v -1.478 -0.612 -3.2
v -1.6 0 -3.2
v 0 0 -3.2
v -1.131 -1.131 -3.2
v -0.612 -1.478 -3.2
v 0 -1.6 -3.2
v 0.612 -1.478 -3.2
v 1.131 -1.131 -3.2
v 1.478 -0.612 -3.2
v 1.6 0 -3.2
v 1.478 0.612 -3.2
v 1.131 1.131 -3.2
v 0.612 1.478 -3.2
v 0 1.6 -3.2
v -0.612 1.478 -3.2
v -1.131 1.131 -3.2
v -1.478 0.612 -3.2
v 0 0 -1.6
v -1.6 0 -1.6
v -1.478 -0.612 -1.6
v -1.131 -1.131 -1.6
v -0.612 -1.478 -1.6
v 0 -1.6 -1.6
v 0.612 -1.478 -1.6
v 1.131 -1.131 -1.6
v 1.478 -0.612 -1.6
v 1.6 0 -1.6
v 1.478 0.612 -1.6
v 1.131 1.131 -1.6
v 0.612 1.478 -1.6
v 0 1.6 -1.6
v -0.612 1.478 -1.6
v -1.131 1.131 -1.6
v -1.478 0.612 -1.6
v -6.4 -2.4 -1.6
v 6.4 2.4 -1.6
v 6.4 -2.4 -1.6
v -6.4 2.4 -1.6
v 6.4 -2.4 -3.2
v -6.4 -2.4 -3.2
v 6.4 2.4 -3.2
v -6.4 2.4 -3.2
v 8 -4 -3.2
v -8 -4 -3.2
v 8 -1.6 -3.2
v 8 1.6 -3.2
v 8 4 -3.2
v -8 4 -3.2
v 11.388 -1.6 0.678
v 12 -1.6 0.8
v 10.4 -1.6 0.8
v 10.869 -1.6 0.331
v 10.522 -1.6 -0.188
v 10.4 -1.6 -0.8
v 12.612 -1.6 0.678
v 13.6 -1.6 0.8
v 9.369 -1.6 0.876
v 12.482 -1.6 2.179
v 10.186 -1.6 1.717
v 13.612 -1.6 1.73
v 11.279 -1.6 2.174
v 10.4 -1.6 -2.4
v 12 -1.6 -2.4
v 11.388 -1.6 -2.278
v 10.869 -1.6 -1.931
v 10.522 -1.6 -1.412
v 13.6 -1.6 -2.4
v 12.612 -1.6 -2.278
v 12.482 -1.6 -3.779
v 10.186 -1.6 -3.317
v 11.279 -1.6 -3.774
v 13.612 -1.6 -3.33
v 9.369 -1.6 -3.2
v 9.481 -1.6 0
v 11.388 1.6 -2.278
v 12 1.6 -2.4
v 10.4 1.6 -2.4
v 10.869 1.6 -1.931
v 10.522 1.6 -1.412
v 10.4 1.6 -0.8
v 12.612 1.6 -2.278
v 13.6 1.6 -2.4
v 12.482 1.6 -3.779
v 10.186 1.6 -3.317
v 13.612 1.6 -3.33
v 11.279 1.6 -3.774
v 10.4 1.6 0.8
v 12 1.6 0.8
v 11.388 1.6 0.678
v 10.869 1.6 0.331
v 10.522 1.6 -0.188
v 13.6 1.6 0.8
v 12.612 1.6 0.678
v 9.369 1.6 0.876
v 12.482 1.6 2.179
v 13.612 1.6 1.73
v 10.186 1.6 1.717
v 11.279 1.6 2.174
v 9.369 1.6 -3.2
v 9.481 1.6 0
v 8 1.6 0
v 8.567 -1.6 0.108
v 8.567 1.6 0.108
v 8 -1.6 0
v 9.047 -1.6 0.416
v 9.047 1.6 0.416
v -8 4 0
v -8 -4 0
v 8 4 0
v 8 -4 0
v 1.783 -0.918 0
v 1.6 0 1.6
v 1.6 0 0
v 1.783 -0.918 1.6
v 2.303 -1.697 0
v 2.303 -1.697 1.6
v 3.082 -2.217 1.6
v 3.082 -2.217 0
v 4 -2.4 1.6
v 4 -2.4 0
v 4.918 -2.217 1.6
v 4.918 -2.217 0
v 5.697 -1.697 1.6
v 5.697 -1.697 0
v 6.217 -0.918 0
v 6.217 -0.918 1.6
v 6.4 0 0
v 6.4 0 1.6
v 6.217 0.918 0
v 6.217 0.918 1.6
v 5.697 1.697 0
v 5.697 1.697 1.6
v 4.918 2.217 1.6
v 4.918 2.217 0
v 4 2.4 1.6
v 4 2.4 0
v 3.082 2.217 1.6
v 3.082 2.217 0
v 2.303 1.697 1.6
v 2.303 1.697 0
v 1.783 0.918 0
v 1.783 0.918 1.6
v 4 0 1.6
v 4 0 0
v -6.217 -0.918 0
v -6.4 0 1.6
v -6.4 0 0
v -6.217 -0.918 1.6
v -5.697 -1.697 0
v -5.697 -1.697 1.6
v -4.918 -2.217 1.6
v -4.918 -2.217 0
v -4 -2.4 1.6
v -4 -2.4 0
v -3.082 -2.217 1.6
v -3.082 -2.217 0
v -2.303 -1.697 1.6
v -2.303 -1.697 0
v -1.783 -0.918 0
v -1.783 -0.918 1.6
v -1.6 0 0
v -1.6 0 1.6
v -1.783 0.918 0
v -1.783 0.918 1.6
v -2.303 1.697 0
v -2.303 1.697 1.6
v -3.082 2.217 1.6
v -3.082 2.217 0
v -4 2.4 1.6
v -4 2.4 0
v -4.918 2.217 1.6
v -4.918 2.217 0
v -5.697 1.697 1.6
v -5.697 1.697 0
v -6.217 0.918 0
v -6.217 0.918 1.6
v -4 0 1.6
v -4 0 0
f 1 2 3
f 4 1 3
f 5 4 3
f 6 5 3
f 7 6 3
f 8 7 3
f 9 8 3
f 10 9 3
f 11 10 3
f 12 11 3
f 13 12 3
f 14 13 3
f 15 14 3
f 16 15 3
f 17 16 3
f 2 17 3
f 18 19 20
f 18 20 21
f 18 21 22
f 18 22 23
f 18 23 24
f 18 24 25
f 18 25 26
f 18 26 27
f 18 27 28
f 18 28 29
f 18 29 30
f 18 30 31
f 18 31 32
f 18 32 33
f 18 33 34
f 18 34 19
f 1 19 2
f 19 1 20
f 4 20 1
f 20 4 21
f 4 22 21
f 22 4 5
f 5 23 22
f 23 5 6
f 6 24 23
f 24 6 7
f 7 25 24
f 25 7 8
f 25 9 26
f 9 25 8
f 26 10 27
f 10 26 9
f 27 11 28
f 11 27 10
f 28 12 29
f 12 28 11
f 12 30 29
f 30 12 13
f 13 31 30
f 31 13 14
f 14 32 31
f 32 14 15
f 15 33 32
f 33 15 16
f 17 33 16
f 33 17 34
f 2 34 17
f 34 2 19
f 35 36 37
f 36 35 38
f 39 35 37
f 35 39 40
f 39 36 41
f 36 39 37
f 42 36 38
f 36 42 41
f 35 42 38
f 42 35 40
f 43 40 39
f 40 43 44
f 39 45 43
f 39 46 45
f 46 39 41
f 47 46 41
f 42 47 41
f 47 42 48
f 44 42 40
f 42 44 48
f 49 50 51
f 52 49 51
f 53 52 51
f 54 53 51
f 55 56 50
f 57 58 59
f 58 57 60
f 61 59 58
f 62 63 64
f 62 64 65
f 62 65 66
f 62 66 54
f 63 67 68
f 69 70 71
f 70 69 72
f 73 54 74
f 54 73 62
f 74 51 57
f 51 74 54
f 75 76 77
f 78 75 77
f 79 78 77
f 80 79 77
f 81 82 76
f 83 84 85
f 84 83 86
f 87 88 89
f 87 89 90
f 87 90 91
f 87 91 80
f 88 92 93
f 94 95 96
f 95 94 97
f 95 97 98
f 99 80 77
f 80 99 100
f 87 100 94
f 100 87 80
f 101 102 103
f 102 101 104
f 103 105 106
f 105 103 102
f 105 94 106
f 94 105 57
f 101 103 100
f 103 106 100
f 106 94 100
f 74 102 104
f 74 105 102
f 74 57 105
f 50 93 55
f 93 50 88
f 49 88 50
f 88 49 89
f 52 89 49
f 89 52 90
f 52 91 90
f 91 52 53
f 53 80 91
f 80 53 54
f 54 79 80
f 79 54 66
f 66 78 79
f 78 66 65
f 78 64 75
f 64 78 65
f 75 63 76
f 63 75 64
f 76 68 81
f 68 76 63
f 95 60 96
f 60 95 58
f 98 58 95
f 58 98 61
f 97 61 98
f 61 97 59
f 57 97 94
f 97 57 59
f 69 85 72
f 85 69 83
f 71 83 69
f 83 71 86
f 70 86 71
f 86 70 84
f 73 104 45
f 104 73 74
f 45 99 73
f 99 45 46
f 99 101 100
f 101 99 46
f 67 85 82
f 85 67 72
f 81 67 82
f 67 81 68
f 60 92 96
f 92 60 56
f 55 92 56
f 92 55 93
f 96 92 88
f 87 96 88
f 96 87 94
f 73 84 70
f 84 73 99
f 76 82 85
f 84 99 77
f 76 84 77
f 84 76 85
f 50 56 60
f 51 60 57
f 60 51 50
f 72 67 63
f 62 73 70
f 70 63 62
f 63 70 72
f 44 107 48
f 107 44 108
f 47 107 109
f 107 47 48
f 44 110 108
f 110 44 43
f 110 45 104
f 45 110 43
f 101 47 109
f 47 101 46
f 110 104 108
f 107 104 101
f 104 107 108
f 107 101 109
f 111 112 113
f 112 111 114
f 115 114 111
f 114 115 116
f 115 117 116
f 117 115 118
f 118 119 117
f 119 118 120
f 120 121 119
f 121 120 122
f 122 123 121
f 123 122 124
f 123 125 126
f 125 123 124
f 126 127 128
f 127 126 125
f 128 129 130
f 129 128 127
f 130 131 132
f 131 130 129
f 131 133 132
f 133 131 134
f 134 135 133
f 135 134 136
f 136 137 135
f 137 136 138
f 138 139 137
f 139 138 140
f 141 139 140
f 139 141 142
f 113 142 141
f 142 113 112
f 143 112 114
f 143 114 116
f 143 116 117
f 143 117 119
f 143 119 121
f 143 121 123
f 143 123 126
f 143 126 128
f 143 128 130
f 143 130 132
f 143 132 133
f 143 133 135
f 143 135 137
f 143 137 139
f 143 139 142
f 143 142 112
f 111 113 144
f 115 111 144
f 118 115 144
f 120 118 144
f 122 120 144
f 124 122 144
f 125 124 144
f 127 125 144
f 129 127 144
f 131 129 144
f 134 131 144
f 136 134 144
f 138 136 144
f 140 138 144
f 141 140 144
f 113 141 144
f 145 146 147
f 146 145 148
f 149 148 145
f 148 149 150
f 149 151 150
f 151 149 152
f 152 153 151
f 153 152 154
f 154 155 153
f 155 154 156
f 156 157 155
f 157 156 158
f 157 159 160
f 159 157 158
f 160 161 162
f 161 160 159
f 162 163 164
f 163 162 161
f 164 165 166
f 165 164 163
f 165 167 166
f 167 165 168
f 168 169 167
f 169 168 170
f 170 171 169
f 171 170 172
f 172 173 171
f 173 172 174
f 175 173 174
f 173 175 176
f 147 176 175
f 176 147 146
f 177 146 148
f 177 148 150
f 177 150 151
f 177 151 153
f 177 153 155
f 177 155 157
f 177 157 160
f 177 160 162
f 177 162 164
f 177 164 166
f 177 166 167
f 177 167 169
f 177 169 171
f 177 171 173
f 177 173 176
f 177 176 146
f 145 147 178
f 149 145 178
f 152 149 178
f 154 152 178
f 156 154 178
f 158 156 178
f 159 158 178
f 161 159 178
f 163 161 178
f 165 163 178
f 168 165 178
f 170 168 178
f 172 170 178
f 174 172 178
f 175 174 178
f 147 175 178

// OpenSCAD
use <../lib.scad>
use <../p/box3u2p.scad>
use <../p/box5.scad>
use <../p/clip6.scad>
use <../p/rect3.scad>
use <../p/stud3.scad>
use <../p/stug-1x2.scad>
function ldraw_lib__63868() = [
// 0 Plate  1 x  2 with Clip Horizontal on End (Thick C-Clip)
// 0 Name: 63868.dat
// 0 Author: Alex Taylor [anathema]
// 0 !LDRAW_ORG Part UPDATE 2013-02
// 0 !LICENSE Licensed under CC BY 4.0 : see CAreadme.txt
// 
// 0 BFC CERTIFY CCW
  [0,"BFC","CERTIFY"],
  [0,"BFC","CCW"],
// 
// 0 !HISTORY 2009-09-03 [PTadmin] Official Update 2009-02
// 0 !HISTORY 2013-02-09 [MagFors] Changed clip primitive
// 0 !HISTORY 2013-09-01 [MagFors] Changed description
// 0 !HISTORY 2013-12-23 [PTadmin] Official Update 2013-02
// 
// 
// 1 16 0 4 0 -1 0 0 0 -1 0 0 0 -1 stud3.dat
  [1,16,0,4,0,-1,0,0,0,-1,0,0,0,-1, ldraw_lib__stud3()],
// 0 BFC INVERTNEXT
  [0,"BFC","INVERTNEXT"],
// 1 16 0 8 0 -16 0 0 0 -4 0 0 0 -6 box5.dat
  [1,16,0,8,0,-16,0,0,0,-4,0,0,0,-6, ldraw_lib__box5()],
// 4 16 -20 8 -10 -16 8 -6 16 8 -6 20 8 -10
  [4,16,-20,8,-10,-16,8,-6,16,8,-6,20,8,-10],
// 3 16 16 8 -6 20 8 -4 20 8 -10
  [3,16,16,8,-6,20,8,-4,20,8,-10],
// 4 16 20 8 -4 16 8 -6 16 8 6 20 8 4
  [4,16,20,8,-4,16,8,-6,16,8,6,20,8,4],
// 3 16 20 8 10 20 8 4 16 8 6
  [3,16,20,8,10,20,8,4,16,8,6],
// 4 16 20 8 10 16 8 6 -16 8 6 -20 8 10
  [4,16,20,8,10,16,8,6,-16,8,6,-20,8,10],
// 4 16 -20 8 10 -16 8 6 -16 8 -6 -20 8 -10
  [4,16,-20,8,10,-16,8,6,-16,8,-6,-20,8,-10],
// 1 16 30 0 0 0 0 -1 0 1 0 1 0 0 clip6.dat
  [1,16,30,0,0,0,0,-1,0,1,0,1,0,0, ldraw_lib__clip6()],
// 1 16 20 4 0 0 -40 0 4 0 0 0 0 10 box3u2p.dat
  [1,16,20,4,0,0,-40,0,4,0,0,0,0,10, ldraw_lib__box3u2p()],
// 1 16 20 4 -7 0 -1 0 -4 0 0 0 0 3 rect3.dat
  [1,16,20,4,-7,0,-1,0,-4,0,0,0,0,3, ldraw_lib__rect3()],
// 1 16 20 4 7 0 -1 0 -4 0 0 0 0 -3 rect3.dat
  [1,16,20,4,7,0,-1,0,-4,0,0,0,0,-3, ldraw_lib__rect3()],
// 3 16 20 0 -10 20 0 -4 -20 0 -10
  [3,16,20,0,-10,20,0,-4,-20,0,-10],
// 4 16 20 0 4 -20 0 10 -20 0 -10 20 0 -4
  [4,16,20,0,4,-20,0,10,-20,0,-10,20,0,-4],
// 3 16 -20 0 10 20 0 4 20 0 10
  [3,16,-20,0,10,20,0,4,20,0,10],
// 1 16 0 0 0 -1 0 0 0 1 0 0 0 -1 stug-1x2.dat
  [1,16,0,0,0,-1,0,0,0,1,0,0,0,-1, ldraw_lib__stug_1x2()],
// 
];
module ldraw_lib__63868(step=0, col=false, unit=2/5, alt=false, line=0.2, solid=!$preview)
    makepoly(ldraw_lib__63868(), step=step, col=col, unit=unit, alt=alt, line=line, solid=solid);
ldraw_lib__63868(line=0.2);
